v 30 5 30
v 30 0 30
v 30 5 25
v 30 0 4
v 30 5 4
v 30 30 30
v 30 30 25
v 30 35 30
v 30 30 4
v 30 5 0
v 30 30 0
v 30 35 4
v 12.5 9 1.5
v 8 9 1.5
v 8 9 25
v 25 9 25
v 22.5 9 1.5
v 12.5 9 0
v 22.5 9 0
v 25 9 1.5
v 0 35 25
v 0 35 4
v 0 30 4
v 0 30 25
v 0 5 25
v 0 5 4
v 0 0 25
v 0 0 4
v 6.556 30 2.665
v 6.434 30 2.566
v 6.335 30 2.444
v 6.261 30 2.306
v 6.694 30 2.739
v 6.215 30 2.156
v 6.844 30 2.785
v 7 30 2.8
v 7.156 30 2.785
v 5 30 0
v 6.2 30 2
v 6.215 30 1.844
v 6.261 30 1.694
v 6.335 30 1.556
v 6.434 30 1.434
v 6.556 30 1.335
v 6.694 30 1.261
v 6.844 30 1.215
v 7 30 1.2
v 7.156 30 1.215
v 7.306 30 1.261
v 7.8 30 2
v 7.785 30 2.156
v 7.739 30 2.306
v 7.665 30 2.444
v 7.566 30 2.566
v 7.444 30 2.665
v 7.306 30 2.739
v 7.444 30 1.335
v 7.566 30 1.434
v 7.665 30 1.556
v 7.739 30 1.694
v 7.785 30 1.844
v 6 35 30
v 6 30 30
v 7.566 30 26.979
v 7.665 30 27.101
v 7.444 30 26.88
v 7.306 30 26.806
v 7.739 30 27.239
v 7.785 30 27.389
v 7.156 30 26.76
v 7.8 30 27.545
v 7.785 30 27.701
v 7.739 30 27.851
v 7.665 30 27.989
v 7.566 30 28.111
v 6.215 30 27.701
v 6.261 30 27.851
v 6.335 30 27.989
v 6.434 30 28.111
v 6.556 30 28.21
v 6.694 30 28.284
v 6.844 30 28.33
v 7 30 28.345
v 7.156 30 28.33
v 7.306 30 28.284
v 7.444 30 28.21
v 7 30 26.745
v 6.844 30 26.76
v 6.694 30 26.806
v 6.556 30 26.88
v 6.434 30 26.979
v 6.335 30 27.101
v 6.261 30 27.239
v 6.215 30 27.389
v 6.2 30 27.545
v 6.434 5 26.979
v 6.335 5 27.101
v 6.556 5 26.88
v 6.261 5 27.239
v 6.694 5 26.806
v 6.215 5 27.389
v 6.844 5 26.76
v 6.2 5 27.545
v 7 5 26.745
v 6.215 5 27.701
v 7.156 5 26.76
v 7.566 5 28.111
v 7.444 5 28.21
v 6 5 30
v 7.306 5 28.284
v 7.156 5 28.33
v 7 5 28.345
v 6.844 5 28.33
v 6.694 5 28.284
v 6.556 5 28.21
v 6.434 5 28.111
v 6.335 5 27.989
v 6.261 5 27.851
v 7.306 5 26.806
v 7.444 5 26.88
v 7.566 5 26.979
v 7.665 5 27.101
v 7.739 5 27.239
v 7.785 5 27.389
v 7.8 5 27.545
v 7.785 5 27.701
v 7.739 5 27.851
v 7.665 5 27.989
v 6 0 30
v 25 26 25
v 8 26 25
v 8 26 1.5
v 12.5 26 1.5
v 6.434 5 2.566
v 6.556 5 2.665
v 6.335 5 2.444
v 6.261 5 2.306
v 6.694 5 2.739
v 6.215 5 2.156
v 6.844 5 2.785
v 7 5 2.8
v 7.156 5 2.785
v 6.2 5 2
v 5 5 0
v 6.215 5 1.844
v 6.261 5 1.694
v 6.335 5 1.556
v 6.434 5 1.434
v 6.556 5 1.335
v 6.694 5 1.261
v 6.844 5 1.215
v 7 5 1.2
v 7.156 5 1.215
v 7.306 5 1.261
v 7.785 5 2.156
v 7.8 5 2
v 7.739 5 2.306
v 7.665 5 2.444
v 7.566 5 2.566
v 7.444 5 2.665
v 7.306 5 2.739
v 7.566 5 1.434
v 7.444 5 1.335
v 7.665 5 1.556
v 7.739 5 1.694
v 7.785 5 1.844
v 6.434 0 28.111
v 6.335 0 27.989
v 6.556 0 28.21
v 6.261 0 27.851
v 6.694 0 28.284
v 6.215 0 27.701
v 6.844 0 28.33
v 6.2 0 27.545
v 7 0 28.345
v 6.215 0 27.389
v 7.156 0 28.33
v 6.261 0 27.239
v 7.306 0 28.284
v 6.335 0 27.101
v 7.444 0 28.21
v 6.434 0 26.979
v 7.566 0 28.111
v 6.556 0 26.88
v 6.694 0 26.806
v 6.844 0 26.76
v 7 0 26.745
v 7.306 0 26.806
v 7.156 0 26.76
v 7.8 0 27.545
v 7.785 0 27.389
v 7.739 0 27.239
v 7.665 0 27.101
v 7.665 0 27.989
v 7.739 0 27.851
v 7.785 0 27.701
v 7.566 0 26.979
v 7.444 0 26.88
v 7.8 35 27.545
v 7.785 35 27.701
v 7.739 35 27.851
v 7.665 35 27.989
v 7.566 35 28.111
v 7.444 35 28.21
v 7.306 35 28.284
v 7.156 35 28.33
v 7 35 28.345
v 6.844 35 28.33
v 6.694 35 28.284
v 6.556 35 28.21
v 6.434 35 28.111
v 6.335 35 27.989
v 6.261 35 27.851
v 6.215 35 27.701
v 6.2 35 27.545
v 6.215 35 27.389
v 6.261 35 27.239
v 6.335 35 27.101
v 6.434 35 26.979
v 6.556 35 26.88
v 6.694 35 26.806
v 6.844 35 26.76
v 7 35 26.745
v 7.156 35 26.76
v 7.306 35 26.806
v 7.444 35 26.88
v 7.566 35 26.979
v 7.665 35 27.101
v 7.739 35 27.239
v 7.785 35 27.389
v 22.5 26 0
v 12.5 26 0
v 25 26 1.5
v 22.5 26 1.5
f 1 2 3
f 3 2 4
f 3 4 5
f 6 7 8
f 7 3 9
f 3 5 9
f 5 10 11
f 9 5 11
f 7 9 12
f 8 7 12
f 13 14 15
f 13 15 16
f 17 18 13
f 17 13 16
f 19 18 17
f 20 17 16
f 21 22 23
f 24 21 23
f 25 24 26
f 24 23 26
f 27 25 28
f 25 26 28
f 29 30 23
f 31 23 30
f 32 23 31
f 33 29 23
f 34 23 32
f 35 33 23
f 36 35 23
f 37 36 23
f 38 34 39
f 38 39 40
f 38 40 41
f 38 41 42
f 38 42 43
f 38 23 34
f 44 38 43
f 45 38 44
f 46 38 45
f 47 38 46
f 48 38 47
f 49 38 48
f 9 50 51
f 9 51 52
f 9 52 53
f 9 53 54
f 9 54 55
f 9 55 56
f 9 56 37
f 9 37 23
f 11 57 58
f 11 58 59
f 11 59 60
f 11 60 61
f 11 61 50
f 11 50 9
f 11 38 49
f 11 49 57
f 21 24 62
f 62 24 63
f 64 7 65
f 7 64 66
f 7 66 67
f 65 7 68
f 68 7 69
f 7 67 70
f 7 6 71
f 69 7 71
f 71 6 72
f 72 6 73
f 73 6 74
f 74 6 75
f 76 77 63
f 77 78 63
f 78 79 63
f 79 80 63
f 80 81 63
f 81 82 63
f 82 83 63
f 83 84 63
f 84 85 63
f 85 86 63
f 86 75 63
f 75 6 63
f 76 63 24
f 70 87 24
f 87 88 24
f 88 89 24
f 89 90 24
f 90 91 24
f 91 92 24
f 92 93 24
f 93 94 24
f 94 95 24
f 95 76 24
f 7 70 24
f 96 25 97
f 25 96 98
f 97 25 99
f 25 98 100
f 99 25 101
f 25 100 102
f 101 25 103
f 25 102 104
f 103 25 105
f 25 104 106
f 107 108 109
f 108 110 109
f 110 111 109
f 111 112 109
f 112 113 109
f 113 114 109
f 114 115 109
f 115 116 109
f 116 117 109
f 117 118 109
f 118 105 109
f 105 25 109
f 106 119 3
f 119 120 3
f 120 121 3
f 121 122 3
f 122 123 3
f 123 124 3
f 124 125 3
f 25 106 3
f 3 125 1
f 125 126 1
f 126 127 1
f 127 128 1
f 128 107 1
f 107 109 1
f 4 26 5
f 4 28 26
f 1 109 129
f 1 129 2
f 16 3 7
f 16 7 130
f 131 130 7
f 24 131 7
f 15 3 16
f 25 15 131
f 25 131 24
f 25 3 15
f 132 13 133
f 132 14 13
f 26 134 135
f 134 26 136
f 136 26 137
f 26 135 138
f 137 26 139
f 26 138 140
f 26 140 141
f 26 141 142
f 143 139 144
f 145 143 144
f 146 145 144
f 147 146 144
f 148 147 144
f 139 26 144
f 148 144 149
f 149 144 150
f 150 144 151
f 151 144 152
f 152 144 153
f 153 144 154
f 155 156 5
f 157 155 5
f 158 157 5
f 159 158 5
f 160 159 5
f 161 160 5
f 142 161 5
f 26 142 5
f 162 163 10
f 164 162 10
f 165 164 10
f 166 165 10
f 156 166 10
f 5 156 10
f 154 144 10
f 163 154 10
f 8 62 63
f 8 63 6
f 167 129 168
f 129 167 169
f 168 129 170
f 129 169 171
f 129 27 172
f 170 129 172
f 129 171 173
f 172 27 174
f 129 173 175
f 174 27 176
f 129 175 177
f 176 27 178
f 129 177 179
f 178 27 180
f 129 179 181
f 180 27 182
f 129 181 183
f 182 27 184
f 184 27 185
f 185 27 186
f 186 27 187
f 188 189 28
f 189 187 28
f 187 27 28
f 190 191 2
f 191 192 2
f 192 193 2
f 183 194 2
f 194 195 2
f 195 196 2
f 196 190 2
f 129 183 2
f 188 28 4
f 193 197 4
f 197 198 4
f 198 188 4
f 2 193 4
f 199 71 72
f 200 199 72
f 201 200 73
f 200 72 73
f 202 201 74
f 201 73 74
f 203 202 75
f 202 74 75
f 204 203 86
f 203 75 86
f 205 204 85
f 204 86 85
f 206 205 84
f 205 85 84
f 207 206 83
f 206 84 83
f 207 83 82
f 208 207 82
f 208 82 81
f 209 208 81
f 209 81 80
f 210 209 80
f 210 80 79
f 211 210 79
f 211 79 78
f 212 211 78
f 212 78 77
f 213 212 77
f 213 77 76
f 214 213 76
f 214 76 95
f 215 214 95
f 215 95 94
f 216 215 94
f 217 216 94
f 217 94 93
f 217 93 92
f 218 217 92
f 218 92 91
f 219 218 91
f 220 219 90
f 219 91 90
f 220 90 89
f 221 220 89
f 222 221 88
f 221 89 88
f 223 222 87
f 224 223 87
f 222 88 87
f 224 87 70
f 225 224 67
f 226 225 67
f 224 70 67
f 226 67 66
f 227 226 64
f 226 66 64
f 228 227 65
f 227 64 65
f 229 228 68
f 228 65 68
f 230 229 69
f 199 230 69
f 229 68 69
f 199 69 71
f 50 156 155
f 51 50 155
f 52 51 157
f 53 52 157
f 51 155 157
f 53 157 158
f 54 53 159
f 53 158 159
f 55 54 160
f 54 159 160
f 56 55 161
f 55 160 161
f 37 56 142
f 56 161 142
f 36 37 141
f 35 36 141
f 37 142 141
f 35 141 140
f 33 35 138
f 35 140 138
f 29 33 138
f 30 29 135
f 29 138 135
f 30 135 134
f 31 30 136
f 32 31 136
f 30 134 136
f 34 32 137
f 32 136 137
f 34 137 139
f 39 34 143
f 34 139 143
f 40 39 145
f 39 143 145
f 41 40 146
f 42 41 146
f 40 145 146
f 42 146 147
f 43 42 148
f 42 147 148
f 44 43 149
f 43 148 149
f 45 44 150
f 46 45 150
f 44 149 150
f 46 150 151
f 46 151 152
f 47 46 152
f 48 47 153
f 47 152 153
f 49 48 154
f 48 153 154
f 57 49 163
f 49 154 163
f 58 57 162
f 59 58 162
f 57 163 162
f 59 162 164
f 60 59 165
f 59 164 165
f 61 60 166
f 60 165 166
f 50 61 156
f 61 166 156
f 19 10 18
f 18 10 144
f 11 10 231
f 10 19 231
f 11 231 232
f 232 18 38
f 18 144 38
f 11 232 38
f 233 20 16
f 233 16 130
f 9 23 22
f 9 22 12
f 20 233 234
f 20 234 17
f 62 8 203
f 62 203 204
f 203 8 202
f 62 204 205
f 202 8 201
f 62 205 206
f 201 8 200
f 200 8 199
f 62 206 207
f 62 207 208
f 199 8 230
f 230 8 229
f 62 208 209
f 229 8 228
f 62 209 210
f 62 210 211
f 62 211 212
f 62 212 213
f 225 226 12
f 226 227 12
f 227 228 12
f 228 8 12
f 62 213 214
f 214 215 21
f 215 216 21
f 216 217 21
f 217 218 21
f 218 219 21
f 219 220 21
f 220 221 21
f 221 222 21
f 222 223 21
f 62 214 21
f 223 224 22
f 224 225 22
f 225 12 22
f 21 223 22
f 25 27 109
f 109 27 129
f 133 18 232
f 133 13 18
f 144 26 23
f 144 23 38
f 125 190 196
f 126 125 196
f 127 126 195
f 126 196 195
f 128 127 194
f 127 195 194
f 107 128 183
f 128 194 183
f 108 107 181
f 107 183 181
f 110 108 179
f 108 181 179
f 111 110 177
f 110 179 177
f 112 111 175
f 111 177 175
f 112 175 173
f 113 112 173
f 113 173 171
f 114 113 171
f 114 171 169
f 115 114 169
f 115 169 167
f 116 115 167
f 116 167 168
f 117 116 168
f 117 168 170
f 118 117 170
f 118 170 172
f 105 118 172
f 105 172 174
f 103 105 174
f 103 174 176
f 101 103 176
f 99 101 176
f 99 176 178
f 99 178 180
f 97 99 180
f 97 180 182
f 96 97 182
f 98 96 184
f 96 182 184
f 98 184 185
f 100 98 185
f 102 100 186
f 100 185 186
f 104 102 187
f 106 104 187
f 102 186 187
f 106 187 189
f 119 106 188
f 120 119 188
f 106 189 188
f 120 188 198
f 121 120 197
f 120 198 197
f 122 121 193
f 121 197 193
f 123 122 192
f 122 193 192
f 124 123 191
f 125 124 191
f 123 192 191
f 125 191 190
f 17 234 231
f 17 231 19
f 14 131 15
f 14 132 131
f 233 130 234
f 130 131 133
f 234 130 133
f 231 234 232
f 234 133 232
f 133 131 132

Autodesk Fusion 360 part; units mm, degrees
sketch "Sketch1" plane through (0, 0, 0) normal (0, 0, 1) x (1, 0, 0)
  line L0 (0, 0) -> (30, 0)
  line L1 (30, 0) -> (30, 35)
  line L2 (30, 35) -> (0, 35)
  line L3 (0, 35) -> (0, 0)
  dimension "d1" = 30
  dimension "d2" = 35
extrude "Extrude1" add sketch "Sketch1" along normal blind 30
sketch "Sketch2" plane through (0, 0, 0) normal (0, 0, -1) x (1, 0, 0)
  line L0 (0, 0) -> (0, -35)
  line L1 (0, -35) -> (30, -35)
  line L2 (30, -35) -> (30, 0)
  line L3 (30, 0) -> (0, 0)
  line L4 (30, 0) -> (0, 0)
  line L5 (0, 0) -> (0, -5)
  line L6 (0, -5) -> (30, -5)
  line L7 (30, -5) -> (30, 0)
  line L8 (30, -35) -> (0, -35)
  line L9 (0, -35) -> (0, -30)
  line L10 (0, -30) -> (30, -30)
  line L11 (30, -30) -> (30, -35)
extrude "Extrude2" cut sketch "Sketch2" against normal blind 4 contours L0 L2 L3 L4 L5 L6 L7 | L0 L1 L2 L8 L9 L10 L11
sketch "Sketch3" plane through (0, 5, 0) normal (0, -1, 0) x (1, 0, 0)
  line L0 (0, 0) -> (30, 0)
  line L1 (30, 0) -> (30, 4)
  line L2 (30, 4) -> (0, 4)
  line L3 (0, 4) -> (0, 0)
  line L4 (0, 4) -> (5, 0)
extrude "Extrude3" cut sketch "Sketch3" against normal blind 100 contours L0 L3 L4
sketch "Sketch4" plane through (0, 5, 0) normal (0, -1, 0) x (1, 0, 0)
  line L0 (0, 4) -> (5, 0)
  line L1 (5, 0) -> (30, 0)
  line L2 (30, 0) -> (30, 4)
  line L3 (30, 4) -> (0, 4)
  circle A0 centre (7, 2.5) radius 1
  dimension "d9" = 2
sketch "Sketch5" plane through (0, 0, 0) normal (0, 0, -1) x (1, 0, 0)
  line L0 (5, -5) -> (5, -30)
  line L1 (5, -30) -> (30, -30)
  line L2 (30, -30) -> (30, -5)
  line L3 (30, -5) -> (5, -5)
  line L4 (25, -26) -> (10, -26)
  line L5 (10, -26) -> (10, -9)
  line L6 (10, -9) -> (25, -9)
  line L7 (25, -9) -> (25, -26)
extrude "Extrude5" cut sketch "Sketch5" against normal blind 100 contours L4 L5 L6 L7
sketch "Sketch6" plane through (25, 0, 0) normal (-1, 0, 0) x (0, -1, 0)
  line L0 (-9, 30) -> (-26, 30)
  line L1 (-26, 30) -> (-26, 0)
  line L2 (-26, 0) -> (-9, 0)
  line L3 (-9, 0) -> (-9, 30)
  line L4 (-9, 0) -> (-26, 0)
  line L5 (-26, 0) -> (-26, 3)
  line L6 (-26, 3) -> (-9, 3)
  line L7 (-9, 3) -> (-9, 0)
  dimension "d14" = 17
  dimension "d15" = 3
extrude "Extrude6" add sketch "Sketch6" along normal blind 5 contours L1 L2 L3 L4 L5 L6 L7
sketch "Sketch7" plane through (0, 0, 0) normal (0, -1, 0) x (1, 0, 0)
  line L0 (0, 4) -> (30, 4)
  line L1 (30, 4) -> (30, 30)
  line L2 (30, 30) -> (0, 30)
  line L3 (0, 30) -> (0, 4)
  line L4 (0, 25) -> (6, 30)
extrude "Extrude7" cut sketch "Sketch7" against normal blind 100 contours L2 L3 L4
sketch "Sketch8" plane through (0, 0, 30) normal (0, 0, 1) x (-1, 0, 0)
  line L0 (-6, -35) -> (-6, 0)
  line L1 (-6, 0) -> (-30, 0)
  line L2 (-30, 0) -> (-30, -35)
  line L3 (-30, -35) -> (-6, -35)
  line L4 (-10, -9) -> (-10, -26)
  line L5 (-10, -26) -> (-25, -26)
  line L6 (-25, -26) -> (-25, -9)
  line L7 (-25, -9) -> (-10, -9)
  line L8 (-30, -30) -> (0, -30)
  line L9 (0, -30) -> (0, -5)
  line L10 (0, -5) -> (-30, -5)
  line L11 (-30, -5) -> (-30, -30)
extrude "Extrude8" cut sketch "Sketch8" against normal blind 5 contours L0 L2 L8 L10 L11 | L0 L8 L9 L10
sketch "Sketch9" plane through (0, 5, 0) normal (0, -1, 0) x (1, 0, 0)
  line L0 (0, 4) -> (5, 0)
  line L1 (5, 0) -> (30, 0)
  line L2 (30, 0) -> (30, 4)
  line L3 (30, 4) -> (0, 4)
  circle A0 centre (7, 2) radius 0.8
  dimension "d22" = 1.6
extrude "Extrude9" cut sketch "Sketch9" against normal blind 100 contours A0
sketch "Sketch10" plane through (0, 0, 0) normal (0, -1, 0) x (1, 0, 0)
  line L0 (6, 30) -> (0, 25)
  line L1 (0, 25) -> (0, 4)
  line L2 (0, 4) -> (30, 4)
  line L3 (30, 4) -> (30, 30)
  line L4 (30, 30) -> (6, 30)
  circle A0 centre (7, 28.5) radius 0.8
  dimension "d25" = 1.6
sketch "Sketch11" plane through (0, 0, 0) normal (0, -1, 0) x (1, 0, 0)
  line L0 (6, 30) -> (0, 25)
  line L1 (0, 25) -> (0, 4)
  line L2 (0, 4) -> (30, 4)
  line L3 (30, 4) -> (30, 30)
  line L4 (30, 30) -> (6, 30)
  circle A0 centre (7, 27.545) radius 0.8
  line L5 (7, 27.545) -> (7, 1)
  dimension "d28" = 1.6
  dimension "d29" = 7
  dimension "d30" = 2.455
extrude "Extrude11" cut sketch "Sketch11" against normal blind 100 contours A0
sketch "Sketch12" plane through (10, 0, 0) normal (1, 0, 0) x (0, 1, 0)
  line L0 (26, 25) -> (9, 25)
  line L1 (9, 25) -> (9, 0)
  line L2 (9, 0) -> (26, 0)
  line L3 (26, 0) -> (26, 25)
  line L4 (26, 0) -> (9, 0)
  line L5 (9, 0) -> (9, 3)
  line L6 (9, 3) -> (26, 3)
  line L7 (26, 3) -> (26, 0)
  dimension "d33" = 17
  dimension "d34" = 3
extrude "Extrude12" add sketch "Sketch12" along normal blind 2 contours L1 L2 L3 L4 L5 L6 L7
extrude "Extrude13" cut 1 faces at (20, 20.3333, 1) along direction (1, 0, 0) blind 2.5
extrude "Extrude14" cut 1 faces at (24.1667, 20.3333, 3) along direction (0, 0, -1) blind 1
extrude "Extrude15" cut 1 faces at (10.6667, 14.6667, 3) along direction (0, 0, -1) blind 1
extrude "Extrude16" cut 2 faces at (10.6667, 14.6667, 2) (24.1667, 20.3333, 2) along direction (0, 0, -1) blind 0.5
extrude "Extrude17" add 1 faces at (12, 14.6667, 0.5) along direction (1, 0, 0) blind 0.5
extrude "Extrude18" cut 1 faces at (10, 20.3333, 9.8333) along direction (-1, 0, 0) blind 2
